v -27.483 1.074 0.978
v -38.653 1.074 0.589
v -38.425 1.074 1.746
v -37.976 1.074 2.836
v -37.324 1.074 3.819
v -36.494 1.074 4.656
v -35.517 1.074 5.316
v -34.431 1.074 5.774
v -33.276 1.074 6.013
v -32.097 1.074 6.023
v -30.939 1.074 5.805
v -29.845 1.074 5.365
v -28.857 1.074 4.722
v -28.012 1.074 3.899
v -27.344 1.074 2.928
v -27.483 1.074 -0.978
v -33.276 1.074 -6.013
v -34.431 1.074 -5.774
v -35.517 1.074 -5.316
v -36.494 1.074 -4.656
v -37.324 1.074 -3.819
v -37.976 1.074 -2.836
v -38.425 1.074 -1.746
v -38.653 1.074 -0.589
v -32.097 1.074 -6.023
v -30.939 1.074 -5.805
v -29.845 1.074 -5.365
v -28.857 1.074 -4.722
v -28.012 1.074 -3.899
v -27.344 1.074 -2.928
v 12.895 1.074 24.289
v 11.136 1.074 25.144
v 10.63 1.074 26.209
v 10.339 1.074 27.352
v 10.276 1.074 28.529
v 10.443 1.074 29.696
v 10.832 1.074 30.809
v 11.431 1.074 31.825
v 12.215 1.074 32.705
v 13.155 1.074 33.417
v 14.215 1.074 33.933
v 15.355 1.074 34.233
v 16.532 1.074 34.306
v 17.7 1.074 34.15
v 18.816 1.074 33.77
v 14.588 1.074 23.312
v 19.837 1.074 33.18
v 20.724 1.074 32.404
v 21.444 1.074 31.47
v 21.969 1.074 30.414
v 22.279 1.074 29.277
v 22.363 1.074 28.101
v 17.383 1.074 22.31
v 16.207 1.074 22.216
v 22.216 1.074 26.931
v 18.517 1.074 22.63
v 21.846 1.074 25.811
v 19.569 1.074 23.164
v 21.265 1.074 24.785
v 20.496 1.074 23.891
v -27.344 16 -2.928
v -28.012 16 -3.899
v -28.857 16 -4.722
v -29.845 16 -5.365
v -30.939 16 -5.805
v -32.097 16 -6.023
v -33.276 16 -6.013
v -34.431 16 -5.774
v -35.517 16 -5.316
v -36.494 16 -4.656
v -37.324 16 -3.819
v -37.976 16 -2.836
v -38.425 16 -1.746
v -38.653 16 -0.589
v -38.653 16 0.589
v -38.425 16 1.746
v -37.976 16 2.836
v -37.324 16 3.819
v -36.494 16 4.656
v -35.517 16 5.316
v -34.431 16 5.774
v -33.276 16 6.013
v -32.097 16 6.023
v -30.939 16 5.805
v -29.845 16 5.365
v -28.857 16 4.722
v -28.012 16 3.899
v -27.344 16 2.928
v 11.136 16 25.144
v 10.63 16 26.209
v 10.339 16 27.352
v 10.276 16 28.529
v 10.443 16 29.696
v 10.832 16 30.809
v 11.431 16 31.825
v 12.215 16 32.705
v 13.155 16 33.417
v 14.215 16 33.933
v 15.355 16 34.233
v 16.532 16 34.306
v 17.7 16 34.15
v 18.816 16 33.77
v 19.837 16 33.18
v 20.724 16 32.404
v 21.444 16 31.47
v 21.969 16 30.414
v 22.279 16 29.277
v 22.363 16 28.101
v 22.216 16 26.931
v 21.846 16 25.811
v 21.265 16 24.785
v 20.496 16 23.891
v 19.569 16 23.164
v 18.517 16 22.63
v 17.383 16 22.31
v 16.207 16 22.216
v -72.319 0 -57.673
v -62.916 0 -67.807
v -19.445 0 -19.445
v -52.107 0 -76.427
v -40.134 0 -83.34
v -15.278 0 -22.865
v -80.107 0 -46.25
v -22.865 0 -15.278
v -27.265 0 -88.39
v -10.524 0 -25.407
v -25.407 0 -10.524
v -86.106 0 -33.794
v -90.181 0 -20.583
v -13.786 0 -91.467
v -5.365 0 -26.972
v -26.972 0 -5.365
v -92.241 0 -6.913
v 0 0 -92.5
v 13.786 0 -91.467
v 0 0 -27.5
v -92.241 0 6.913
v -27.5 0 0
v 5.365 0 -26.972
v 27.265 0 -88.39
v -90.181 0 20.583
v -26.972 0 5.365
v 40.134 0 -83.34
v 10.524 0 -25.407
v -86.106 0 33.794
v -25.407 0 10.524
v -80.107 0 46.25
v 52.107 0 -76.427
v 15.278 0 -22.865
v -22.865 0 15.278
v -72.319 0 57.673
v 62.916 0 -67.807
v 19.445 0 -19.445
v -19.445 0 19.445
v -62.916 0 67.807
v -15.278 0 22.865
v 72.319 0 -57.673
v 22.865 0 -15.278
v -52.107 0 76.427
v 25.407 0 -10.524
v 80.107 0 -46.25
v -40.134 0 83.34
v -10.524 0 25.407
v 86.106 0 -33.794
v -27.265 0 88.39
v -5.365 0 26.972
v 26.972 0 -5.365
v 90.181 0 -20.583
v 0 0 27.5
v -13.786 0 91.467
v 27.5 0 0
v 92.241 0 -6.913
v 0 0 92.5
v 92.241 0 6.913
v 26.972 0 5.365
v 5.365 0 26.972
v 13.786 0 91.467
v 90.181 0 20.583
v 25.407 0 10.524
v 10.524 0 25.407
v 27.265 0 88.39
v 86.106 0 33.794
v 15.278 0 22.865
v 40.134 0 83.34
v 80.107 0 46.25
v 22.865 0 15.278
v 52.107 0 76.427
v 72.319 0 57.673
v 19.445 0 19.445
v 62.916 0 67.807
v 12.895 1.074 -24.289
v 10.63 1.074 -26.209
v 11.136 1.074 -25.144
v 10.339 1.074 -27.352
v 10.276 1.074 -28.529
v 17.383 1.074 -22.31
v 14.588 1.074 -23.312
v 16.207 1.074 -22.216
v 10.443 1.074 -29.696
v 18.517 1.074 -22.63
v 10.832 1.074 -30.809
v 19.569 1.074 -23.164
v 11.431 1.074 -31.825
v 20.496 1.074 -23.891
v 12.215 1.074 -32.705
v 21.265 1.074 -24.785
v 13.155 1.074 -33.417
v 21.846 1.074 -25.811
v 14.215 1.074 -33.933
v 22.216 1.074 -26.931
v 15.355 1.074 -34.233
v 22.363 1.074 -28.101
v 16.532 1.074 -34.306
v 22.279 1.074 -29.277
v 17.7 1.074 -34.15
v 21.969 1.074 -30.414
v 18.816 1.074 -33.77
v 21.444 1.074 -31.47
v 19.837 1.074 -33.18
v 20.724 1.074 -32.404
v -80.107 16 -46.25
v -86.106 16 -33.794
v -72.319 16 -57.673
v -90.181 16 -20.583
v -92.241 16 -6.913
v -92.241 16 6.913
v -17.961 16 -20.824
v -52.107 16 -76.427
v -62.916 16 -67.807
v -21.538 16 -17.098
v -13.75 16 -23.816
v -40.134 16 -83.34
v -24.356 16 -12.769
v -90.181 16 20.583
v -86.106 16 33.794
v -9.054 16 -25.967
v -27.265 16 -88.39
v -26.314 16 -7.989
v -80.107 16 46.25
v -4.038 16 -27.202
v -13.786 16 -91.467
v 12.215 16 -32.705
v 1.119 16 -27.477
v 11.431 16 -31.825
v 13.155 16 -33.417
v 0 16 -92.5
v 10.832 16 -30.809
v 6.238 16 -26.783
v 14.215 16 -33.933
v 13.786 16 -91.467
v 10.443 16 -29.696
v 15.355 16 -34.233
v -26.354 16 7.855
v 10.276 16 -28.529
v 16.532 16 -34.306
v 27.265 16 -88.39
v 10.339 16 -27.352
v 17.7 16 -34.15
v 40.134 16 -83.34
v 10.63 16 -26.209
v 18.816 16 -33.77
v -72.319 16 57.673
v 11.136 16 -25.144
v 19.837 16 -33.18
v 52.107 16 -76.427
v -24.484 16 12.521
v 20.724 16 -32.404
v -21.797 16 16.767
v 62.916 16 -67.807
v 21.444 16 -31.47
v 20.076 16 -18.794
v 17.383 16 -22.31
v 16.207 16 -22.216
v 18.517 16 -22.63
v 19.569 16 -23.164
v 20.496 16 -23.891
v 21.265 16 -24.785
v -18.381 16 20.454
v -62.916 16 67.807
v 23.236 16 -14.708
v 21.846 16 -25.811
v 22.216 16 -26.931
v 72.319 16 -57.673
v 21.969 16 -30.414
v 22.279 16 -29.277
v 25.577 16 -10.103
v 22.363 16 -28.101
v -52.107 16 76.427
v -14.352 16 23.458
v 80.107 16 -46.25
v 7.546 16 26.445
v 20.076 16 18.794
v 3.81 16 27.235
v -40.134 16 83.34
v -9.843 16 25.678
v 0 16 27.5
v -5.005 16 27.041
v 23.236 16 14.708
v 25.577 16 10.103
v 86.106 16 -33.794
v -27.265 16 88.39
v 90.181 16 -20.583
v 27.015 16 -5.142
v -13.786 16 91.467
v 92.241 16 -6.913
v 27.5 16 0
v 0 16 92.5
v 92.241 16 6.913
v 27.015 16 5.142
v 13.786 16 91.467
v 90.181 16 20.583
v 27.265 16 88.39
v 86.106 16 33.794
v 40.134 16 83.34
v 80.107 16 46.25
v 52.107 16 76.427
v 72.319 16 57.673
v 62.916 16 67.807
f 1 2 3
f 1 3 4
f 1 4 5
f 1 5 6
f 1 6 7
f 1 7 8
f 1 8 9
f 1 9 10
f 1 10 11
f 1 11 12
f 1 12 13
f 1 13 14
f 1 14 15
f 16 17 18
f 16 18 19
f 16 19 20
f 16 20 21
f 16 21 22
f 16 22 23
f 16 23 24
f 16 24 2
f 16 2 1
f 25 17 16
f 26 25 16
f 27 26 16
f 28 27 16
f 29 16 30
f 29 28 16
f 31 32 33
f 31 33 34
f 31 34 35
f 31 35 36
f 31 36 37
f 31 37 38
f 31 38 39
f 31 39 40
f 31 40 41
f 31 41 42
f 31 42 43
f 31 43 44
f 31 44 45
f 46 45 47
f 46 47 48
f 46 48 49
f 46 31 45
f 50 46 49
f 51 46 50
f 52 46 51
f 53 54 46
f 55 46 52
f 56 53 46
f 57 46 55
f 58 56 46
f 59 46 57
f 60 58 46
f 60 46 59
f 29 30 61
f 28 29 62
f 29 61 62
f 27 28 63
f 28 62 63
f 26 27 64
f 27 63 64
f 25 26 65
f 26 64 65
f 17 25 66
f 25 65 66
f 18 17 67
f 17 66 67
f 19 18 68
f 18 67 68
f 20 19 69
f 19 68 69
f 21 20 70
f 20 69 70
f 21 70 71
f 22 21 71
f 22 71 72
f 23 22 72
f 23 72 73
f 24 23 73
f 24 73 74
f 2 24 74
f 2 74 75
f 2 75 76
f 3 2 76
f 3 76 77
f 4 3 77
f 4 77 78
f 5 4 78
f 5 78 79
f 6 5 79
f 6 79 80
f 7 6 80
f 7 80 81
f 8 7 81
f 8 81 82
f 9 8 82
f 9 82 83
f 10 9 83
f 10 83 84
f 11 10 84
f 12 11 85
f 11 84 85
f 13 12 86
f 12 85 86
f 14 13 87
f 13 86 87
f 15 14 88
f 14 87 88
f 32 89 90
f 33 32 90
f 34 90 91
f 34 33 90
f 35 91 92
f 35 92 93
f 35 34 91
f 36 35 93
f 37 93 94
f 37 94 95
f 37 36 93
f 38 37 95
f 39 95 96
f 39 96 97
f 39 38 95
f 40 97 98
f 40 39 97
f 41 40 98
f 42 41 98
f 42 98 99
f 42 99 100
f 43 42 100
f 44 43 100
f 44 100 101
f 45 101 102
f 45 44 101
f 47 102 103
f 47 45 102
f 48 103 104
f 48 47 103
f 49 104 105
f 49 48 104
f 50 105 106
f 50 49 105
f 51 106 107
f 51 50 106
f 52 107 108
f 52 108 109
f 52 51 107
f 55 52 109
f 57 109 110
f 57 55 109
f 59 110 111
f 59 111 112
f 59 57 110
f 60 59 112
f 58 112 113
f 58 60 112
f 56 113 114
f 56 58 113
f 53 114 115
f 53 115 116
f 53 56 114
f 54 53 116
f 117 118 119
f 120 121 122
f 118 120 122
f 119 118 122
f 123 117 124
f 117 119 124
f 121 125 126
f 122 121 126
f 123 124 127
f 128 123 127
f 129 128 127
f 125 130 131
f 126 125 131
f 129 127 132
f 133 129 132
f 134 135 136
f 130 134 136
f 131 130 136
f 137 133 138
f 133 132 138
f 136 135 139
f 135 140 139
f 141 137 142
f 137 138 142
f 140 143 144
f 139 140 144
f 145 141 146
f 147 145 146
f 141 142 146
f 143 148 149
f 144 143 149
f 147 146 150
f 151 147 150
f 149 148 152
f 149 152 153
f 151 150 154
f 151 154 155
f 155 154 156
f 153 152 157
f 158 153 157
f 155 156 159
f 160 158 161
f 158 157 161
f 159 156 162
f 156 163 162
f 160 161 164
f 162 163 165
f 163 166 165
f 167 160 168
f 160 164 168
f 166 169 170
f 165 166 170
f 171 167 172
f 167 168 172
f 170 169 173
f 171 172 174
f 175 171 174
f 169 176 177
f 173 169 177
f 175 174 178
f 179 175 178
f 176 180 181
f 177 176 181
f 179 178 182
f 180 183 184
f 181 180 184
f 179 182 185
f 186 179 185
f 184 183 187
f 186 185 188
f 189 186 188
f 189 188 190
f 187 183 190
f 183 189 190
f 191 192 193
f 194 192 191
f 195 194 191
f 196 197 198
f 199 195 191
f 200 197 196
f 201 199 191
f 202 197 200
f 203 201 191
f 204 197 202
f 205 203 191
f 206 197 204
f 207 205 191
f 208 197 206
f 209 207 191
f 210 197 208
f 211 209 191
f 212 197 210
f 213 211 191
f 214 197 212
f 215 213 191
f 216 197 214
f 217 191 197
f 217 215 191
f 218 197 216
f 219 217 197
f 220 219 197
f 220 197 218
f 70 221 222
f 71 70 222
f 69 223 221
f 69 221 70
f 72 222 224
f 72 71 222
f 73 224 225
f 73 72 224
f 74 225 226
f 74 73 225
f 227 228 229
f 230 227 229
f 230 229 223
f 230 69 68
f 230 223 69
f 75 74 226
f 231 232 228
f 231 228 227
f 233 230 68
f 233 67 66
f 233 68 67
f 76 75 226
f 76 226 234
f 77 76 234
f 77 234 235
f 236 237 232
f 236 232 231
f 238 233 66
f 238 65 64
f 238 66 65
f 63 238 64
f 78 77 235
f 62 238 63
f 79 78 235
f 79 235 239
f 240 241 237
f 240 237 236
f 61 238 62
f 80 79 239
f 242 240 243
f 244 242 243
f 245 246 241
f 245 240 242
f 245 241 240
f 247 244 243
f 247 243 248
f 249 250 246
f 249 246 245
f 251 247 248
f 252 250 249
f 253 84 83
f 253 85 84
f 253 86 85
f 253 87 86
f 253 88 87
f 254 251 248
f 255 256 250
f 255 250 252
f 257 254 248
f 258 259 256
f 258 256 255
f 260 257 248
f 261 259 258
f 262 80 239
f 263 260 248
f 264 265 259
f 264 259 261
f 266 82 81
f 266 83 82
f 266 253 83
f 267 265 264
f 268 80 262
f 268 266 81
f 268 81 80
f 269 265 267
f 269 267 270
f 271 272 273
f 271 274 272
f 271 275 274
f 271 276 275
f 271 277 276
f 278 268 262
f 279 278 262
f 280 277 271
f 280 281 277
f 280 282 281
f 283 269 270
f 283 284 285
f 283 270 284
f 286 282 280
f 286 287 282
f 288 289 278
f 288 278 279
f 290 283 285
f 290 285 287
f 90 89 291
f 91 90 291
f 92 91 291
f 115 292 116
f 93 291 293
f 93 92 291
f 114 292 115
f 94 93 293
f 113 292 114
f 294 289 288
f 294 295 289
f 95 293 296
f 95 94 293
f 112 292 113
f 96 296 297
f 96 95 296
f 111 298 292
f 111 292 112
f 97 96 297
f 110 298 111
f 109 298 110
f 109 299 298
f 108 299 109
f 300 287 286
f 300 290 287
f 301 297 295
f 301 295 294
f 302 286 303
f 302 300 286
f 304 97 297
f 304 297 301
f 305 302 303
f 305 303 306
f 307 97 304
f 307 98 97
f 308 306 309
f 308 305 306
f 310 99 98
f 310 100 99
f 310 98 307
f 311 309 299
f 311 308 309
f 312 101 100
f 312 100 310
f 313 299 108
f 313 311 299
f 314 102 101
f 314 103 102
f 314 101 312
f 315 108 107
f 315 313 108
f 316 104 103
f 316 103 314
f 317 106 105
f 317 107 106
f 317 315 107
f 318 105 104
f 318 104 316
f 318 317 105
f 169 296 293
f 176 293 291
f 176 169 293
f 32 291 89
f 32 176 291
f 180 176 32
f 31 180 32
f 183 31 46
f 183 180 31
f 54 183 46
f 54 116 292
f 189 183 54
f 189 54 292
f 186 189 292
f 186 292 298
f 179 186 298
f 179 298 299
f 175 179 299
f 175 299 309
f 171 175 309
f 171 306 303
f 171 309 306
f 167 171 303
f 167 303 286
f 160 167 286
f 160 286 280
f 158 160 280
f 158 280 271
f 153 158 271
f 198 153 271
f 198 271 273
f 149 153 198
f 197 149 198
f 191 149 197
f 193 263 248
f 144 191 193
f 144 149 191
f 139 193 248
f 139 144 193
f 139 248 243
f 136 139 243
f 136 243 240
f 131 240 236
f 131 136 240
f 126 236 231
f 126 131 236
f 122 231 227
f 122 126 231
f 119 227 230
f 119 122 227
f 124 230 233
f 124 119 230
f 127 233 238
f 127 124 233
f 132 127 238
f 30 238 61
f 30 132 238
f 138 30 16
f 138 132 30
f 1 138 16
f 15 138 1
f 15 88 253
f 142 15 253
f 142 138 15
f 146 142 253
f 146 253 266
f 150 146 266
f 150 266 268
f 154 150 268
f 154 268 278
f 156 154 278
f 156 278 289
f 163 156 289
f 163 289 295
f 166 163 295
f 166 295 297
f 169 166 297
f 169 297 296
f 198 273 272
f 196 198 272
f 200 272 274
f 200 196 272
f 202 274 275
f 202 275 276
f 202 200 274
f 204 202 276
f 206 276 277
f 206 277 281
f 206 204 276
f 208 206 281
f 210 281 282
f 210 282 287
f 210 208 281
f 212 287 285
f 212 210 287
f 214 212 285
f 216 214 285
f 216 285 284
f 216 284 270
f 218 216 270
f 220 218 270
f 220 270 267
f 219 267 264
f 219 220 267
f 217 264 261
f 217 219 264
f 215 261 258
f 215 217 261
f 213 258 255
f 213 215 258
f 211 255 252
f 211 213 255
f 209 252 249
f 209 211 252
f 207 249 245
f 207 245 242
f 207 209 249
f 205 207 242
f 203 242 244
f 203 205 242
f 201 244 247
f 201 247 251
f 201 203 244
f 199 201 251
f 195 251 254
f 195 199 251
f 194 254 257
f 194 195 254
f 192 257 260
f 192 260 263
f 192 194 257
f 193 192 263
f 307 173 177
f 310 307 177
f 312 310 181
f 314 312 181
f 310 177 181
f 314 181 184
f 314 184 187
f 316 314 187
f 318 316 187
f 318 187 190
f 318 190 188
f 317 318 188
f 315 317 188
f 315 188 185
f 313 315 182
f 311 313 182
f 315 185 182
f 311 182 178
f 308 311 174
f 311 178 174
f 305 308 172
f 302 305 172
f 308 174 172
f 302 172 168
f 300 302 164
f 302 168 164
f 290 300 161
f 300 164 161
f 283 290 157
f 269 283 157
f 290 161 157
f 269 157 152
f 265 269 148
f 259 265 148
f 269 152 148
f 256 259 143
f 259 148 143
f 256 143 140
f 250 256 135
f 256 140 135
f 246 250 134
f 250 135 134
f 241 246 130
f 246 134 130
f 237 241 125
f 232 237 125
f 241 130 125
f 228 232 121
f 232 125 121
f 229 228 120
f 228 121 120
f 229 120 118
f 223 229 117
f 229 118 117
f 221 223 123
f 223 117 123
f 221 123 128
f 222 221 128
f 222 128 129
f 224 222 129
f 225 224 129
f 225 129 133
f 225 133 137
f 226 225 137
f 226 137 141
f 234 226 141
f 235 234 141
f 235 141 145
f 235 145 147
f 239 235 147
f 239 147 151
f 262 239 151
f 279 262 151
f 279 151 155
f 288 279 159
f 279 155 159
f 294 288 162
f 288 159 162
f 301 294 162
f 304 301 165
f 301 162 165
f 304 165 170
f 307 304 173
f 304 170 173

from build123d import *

# Parameters (mm, degrees)
SKETCH1_R           = 92.5
BOSS_EXTRUDE1_DEPTH = 16
SKETCH2_R           = 27.5
CUT_EXTRUDE1_DEPTH  = 132.789605053
SKETCH3_R           = 6.047272506
CUT_EXTRUDE2_DEPTH  = 14.926051379
CIRPATTERN1_COUNT   = 3


with BuildPart() as part:
    # Sketch1 → Boss-Extrude1 (new body)
    with BuildSketch(Plane(origin=(0, 0, 0), x_dir=(1, 0, 0), z_dir=(0, 1, 0))):
        Circle(SKETCH1_R)
    extrude(amount=BOSS_EXTRUDE1_DEPTH)

    # Sketch2 → Cut-Extrude1 (cut, through all)
    with BuildSketch(Plane(origin=(0, 0, 0), x_dir=(1, 0, 0), z_dir=(0, 1, 0))):
        Circle(SKETCH2_R)
    extrude(amount=CUT_EXTRUDE1_DEPTH, mode=Mode.SUBTRACT)

    # Sketch3 → Cut-Extrude2 (cut)
    with BuildSketch(Plane(origin=(0, 16, 0), x_dir=(1, 0, 0), z_dir=(0, 1, 0))):
        with Locations((-32.634958459, 0)):
            Circle(SKETCH3_R)
    cut_extrude2 = extrude(amount=-CUT_EXTRUDE2_DEPTH, mode=Mode.SUBTRACT)

    # CirPattern1: Cut-Extrude2 ×3 about axis
    cirpattern1_axis = Axis((0, 0, 0), (0, 1, 0))
    for i in range(1, CIRPATTERN1_COUNT):
        add(cut_extrude2.rotate(cirpattern1_axis, i * 360 / CIRPATTERN1_COUNT), mode=Mode.SUBTRACT)


solid = part.part
